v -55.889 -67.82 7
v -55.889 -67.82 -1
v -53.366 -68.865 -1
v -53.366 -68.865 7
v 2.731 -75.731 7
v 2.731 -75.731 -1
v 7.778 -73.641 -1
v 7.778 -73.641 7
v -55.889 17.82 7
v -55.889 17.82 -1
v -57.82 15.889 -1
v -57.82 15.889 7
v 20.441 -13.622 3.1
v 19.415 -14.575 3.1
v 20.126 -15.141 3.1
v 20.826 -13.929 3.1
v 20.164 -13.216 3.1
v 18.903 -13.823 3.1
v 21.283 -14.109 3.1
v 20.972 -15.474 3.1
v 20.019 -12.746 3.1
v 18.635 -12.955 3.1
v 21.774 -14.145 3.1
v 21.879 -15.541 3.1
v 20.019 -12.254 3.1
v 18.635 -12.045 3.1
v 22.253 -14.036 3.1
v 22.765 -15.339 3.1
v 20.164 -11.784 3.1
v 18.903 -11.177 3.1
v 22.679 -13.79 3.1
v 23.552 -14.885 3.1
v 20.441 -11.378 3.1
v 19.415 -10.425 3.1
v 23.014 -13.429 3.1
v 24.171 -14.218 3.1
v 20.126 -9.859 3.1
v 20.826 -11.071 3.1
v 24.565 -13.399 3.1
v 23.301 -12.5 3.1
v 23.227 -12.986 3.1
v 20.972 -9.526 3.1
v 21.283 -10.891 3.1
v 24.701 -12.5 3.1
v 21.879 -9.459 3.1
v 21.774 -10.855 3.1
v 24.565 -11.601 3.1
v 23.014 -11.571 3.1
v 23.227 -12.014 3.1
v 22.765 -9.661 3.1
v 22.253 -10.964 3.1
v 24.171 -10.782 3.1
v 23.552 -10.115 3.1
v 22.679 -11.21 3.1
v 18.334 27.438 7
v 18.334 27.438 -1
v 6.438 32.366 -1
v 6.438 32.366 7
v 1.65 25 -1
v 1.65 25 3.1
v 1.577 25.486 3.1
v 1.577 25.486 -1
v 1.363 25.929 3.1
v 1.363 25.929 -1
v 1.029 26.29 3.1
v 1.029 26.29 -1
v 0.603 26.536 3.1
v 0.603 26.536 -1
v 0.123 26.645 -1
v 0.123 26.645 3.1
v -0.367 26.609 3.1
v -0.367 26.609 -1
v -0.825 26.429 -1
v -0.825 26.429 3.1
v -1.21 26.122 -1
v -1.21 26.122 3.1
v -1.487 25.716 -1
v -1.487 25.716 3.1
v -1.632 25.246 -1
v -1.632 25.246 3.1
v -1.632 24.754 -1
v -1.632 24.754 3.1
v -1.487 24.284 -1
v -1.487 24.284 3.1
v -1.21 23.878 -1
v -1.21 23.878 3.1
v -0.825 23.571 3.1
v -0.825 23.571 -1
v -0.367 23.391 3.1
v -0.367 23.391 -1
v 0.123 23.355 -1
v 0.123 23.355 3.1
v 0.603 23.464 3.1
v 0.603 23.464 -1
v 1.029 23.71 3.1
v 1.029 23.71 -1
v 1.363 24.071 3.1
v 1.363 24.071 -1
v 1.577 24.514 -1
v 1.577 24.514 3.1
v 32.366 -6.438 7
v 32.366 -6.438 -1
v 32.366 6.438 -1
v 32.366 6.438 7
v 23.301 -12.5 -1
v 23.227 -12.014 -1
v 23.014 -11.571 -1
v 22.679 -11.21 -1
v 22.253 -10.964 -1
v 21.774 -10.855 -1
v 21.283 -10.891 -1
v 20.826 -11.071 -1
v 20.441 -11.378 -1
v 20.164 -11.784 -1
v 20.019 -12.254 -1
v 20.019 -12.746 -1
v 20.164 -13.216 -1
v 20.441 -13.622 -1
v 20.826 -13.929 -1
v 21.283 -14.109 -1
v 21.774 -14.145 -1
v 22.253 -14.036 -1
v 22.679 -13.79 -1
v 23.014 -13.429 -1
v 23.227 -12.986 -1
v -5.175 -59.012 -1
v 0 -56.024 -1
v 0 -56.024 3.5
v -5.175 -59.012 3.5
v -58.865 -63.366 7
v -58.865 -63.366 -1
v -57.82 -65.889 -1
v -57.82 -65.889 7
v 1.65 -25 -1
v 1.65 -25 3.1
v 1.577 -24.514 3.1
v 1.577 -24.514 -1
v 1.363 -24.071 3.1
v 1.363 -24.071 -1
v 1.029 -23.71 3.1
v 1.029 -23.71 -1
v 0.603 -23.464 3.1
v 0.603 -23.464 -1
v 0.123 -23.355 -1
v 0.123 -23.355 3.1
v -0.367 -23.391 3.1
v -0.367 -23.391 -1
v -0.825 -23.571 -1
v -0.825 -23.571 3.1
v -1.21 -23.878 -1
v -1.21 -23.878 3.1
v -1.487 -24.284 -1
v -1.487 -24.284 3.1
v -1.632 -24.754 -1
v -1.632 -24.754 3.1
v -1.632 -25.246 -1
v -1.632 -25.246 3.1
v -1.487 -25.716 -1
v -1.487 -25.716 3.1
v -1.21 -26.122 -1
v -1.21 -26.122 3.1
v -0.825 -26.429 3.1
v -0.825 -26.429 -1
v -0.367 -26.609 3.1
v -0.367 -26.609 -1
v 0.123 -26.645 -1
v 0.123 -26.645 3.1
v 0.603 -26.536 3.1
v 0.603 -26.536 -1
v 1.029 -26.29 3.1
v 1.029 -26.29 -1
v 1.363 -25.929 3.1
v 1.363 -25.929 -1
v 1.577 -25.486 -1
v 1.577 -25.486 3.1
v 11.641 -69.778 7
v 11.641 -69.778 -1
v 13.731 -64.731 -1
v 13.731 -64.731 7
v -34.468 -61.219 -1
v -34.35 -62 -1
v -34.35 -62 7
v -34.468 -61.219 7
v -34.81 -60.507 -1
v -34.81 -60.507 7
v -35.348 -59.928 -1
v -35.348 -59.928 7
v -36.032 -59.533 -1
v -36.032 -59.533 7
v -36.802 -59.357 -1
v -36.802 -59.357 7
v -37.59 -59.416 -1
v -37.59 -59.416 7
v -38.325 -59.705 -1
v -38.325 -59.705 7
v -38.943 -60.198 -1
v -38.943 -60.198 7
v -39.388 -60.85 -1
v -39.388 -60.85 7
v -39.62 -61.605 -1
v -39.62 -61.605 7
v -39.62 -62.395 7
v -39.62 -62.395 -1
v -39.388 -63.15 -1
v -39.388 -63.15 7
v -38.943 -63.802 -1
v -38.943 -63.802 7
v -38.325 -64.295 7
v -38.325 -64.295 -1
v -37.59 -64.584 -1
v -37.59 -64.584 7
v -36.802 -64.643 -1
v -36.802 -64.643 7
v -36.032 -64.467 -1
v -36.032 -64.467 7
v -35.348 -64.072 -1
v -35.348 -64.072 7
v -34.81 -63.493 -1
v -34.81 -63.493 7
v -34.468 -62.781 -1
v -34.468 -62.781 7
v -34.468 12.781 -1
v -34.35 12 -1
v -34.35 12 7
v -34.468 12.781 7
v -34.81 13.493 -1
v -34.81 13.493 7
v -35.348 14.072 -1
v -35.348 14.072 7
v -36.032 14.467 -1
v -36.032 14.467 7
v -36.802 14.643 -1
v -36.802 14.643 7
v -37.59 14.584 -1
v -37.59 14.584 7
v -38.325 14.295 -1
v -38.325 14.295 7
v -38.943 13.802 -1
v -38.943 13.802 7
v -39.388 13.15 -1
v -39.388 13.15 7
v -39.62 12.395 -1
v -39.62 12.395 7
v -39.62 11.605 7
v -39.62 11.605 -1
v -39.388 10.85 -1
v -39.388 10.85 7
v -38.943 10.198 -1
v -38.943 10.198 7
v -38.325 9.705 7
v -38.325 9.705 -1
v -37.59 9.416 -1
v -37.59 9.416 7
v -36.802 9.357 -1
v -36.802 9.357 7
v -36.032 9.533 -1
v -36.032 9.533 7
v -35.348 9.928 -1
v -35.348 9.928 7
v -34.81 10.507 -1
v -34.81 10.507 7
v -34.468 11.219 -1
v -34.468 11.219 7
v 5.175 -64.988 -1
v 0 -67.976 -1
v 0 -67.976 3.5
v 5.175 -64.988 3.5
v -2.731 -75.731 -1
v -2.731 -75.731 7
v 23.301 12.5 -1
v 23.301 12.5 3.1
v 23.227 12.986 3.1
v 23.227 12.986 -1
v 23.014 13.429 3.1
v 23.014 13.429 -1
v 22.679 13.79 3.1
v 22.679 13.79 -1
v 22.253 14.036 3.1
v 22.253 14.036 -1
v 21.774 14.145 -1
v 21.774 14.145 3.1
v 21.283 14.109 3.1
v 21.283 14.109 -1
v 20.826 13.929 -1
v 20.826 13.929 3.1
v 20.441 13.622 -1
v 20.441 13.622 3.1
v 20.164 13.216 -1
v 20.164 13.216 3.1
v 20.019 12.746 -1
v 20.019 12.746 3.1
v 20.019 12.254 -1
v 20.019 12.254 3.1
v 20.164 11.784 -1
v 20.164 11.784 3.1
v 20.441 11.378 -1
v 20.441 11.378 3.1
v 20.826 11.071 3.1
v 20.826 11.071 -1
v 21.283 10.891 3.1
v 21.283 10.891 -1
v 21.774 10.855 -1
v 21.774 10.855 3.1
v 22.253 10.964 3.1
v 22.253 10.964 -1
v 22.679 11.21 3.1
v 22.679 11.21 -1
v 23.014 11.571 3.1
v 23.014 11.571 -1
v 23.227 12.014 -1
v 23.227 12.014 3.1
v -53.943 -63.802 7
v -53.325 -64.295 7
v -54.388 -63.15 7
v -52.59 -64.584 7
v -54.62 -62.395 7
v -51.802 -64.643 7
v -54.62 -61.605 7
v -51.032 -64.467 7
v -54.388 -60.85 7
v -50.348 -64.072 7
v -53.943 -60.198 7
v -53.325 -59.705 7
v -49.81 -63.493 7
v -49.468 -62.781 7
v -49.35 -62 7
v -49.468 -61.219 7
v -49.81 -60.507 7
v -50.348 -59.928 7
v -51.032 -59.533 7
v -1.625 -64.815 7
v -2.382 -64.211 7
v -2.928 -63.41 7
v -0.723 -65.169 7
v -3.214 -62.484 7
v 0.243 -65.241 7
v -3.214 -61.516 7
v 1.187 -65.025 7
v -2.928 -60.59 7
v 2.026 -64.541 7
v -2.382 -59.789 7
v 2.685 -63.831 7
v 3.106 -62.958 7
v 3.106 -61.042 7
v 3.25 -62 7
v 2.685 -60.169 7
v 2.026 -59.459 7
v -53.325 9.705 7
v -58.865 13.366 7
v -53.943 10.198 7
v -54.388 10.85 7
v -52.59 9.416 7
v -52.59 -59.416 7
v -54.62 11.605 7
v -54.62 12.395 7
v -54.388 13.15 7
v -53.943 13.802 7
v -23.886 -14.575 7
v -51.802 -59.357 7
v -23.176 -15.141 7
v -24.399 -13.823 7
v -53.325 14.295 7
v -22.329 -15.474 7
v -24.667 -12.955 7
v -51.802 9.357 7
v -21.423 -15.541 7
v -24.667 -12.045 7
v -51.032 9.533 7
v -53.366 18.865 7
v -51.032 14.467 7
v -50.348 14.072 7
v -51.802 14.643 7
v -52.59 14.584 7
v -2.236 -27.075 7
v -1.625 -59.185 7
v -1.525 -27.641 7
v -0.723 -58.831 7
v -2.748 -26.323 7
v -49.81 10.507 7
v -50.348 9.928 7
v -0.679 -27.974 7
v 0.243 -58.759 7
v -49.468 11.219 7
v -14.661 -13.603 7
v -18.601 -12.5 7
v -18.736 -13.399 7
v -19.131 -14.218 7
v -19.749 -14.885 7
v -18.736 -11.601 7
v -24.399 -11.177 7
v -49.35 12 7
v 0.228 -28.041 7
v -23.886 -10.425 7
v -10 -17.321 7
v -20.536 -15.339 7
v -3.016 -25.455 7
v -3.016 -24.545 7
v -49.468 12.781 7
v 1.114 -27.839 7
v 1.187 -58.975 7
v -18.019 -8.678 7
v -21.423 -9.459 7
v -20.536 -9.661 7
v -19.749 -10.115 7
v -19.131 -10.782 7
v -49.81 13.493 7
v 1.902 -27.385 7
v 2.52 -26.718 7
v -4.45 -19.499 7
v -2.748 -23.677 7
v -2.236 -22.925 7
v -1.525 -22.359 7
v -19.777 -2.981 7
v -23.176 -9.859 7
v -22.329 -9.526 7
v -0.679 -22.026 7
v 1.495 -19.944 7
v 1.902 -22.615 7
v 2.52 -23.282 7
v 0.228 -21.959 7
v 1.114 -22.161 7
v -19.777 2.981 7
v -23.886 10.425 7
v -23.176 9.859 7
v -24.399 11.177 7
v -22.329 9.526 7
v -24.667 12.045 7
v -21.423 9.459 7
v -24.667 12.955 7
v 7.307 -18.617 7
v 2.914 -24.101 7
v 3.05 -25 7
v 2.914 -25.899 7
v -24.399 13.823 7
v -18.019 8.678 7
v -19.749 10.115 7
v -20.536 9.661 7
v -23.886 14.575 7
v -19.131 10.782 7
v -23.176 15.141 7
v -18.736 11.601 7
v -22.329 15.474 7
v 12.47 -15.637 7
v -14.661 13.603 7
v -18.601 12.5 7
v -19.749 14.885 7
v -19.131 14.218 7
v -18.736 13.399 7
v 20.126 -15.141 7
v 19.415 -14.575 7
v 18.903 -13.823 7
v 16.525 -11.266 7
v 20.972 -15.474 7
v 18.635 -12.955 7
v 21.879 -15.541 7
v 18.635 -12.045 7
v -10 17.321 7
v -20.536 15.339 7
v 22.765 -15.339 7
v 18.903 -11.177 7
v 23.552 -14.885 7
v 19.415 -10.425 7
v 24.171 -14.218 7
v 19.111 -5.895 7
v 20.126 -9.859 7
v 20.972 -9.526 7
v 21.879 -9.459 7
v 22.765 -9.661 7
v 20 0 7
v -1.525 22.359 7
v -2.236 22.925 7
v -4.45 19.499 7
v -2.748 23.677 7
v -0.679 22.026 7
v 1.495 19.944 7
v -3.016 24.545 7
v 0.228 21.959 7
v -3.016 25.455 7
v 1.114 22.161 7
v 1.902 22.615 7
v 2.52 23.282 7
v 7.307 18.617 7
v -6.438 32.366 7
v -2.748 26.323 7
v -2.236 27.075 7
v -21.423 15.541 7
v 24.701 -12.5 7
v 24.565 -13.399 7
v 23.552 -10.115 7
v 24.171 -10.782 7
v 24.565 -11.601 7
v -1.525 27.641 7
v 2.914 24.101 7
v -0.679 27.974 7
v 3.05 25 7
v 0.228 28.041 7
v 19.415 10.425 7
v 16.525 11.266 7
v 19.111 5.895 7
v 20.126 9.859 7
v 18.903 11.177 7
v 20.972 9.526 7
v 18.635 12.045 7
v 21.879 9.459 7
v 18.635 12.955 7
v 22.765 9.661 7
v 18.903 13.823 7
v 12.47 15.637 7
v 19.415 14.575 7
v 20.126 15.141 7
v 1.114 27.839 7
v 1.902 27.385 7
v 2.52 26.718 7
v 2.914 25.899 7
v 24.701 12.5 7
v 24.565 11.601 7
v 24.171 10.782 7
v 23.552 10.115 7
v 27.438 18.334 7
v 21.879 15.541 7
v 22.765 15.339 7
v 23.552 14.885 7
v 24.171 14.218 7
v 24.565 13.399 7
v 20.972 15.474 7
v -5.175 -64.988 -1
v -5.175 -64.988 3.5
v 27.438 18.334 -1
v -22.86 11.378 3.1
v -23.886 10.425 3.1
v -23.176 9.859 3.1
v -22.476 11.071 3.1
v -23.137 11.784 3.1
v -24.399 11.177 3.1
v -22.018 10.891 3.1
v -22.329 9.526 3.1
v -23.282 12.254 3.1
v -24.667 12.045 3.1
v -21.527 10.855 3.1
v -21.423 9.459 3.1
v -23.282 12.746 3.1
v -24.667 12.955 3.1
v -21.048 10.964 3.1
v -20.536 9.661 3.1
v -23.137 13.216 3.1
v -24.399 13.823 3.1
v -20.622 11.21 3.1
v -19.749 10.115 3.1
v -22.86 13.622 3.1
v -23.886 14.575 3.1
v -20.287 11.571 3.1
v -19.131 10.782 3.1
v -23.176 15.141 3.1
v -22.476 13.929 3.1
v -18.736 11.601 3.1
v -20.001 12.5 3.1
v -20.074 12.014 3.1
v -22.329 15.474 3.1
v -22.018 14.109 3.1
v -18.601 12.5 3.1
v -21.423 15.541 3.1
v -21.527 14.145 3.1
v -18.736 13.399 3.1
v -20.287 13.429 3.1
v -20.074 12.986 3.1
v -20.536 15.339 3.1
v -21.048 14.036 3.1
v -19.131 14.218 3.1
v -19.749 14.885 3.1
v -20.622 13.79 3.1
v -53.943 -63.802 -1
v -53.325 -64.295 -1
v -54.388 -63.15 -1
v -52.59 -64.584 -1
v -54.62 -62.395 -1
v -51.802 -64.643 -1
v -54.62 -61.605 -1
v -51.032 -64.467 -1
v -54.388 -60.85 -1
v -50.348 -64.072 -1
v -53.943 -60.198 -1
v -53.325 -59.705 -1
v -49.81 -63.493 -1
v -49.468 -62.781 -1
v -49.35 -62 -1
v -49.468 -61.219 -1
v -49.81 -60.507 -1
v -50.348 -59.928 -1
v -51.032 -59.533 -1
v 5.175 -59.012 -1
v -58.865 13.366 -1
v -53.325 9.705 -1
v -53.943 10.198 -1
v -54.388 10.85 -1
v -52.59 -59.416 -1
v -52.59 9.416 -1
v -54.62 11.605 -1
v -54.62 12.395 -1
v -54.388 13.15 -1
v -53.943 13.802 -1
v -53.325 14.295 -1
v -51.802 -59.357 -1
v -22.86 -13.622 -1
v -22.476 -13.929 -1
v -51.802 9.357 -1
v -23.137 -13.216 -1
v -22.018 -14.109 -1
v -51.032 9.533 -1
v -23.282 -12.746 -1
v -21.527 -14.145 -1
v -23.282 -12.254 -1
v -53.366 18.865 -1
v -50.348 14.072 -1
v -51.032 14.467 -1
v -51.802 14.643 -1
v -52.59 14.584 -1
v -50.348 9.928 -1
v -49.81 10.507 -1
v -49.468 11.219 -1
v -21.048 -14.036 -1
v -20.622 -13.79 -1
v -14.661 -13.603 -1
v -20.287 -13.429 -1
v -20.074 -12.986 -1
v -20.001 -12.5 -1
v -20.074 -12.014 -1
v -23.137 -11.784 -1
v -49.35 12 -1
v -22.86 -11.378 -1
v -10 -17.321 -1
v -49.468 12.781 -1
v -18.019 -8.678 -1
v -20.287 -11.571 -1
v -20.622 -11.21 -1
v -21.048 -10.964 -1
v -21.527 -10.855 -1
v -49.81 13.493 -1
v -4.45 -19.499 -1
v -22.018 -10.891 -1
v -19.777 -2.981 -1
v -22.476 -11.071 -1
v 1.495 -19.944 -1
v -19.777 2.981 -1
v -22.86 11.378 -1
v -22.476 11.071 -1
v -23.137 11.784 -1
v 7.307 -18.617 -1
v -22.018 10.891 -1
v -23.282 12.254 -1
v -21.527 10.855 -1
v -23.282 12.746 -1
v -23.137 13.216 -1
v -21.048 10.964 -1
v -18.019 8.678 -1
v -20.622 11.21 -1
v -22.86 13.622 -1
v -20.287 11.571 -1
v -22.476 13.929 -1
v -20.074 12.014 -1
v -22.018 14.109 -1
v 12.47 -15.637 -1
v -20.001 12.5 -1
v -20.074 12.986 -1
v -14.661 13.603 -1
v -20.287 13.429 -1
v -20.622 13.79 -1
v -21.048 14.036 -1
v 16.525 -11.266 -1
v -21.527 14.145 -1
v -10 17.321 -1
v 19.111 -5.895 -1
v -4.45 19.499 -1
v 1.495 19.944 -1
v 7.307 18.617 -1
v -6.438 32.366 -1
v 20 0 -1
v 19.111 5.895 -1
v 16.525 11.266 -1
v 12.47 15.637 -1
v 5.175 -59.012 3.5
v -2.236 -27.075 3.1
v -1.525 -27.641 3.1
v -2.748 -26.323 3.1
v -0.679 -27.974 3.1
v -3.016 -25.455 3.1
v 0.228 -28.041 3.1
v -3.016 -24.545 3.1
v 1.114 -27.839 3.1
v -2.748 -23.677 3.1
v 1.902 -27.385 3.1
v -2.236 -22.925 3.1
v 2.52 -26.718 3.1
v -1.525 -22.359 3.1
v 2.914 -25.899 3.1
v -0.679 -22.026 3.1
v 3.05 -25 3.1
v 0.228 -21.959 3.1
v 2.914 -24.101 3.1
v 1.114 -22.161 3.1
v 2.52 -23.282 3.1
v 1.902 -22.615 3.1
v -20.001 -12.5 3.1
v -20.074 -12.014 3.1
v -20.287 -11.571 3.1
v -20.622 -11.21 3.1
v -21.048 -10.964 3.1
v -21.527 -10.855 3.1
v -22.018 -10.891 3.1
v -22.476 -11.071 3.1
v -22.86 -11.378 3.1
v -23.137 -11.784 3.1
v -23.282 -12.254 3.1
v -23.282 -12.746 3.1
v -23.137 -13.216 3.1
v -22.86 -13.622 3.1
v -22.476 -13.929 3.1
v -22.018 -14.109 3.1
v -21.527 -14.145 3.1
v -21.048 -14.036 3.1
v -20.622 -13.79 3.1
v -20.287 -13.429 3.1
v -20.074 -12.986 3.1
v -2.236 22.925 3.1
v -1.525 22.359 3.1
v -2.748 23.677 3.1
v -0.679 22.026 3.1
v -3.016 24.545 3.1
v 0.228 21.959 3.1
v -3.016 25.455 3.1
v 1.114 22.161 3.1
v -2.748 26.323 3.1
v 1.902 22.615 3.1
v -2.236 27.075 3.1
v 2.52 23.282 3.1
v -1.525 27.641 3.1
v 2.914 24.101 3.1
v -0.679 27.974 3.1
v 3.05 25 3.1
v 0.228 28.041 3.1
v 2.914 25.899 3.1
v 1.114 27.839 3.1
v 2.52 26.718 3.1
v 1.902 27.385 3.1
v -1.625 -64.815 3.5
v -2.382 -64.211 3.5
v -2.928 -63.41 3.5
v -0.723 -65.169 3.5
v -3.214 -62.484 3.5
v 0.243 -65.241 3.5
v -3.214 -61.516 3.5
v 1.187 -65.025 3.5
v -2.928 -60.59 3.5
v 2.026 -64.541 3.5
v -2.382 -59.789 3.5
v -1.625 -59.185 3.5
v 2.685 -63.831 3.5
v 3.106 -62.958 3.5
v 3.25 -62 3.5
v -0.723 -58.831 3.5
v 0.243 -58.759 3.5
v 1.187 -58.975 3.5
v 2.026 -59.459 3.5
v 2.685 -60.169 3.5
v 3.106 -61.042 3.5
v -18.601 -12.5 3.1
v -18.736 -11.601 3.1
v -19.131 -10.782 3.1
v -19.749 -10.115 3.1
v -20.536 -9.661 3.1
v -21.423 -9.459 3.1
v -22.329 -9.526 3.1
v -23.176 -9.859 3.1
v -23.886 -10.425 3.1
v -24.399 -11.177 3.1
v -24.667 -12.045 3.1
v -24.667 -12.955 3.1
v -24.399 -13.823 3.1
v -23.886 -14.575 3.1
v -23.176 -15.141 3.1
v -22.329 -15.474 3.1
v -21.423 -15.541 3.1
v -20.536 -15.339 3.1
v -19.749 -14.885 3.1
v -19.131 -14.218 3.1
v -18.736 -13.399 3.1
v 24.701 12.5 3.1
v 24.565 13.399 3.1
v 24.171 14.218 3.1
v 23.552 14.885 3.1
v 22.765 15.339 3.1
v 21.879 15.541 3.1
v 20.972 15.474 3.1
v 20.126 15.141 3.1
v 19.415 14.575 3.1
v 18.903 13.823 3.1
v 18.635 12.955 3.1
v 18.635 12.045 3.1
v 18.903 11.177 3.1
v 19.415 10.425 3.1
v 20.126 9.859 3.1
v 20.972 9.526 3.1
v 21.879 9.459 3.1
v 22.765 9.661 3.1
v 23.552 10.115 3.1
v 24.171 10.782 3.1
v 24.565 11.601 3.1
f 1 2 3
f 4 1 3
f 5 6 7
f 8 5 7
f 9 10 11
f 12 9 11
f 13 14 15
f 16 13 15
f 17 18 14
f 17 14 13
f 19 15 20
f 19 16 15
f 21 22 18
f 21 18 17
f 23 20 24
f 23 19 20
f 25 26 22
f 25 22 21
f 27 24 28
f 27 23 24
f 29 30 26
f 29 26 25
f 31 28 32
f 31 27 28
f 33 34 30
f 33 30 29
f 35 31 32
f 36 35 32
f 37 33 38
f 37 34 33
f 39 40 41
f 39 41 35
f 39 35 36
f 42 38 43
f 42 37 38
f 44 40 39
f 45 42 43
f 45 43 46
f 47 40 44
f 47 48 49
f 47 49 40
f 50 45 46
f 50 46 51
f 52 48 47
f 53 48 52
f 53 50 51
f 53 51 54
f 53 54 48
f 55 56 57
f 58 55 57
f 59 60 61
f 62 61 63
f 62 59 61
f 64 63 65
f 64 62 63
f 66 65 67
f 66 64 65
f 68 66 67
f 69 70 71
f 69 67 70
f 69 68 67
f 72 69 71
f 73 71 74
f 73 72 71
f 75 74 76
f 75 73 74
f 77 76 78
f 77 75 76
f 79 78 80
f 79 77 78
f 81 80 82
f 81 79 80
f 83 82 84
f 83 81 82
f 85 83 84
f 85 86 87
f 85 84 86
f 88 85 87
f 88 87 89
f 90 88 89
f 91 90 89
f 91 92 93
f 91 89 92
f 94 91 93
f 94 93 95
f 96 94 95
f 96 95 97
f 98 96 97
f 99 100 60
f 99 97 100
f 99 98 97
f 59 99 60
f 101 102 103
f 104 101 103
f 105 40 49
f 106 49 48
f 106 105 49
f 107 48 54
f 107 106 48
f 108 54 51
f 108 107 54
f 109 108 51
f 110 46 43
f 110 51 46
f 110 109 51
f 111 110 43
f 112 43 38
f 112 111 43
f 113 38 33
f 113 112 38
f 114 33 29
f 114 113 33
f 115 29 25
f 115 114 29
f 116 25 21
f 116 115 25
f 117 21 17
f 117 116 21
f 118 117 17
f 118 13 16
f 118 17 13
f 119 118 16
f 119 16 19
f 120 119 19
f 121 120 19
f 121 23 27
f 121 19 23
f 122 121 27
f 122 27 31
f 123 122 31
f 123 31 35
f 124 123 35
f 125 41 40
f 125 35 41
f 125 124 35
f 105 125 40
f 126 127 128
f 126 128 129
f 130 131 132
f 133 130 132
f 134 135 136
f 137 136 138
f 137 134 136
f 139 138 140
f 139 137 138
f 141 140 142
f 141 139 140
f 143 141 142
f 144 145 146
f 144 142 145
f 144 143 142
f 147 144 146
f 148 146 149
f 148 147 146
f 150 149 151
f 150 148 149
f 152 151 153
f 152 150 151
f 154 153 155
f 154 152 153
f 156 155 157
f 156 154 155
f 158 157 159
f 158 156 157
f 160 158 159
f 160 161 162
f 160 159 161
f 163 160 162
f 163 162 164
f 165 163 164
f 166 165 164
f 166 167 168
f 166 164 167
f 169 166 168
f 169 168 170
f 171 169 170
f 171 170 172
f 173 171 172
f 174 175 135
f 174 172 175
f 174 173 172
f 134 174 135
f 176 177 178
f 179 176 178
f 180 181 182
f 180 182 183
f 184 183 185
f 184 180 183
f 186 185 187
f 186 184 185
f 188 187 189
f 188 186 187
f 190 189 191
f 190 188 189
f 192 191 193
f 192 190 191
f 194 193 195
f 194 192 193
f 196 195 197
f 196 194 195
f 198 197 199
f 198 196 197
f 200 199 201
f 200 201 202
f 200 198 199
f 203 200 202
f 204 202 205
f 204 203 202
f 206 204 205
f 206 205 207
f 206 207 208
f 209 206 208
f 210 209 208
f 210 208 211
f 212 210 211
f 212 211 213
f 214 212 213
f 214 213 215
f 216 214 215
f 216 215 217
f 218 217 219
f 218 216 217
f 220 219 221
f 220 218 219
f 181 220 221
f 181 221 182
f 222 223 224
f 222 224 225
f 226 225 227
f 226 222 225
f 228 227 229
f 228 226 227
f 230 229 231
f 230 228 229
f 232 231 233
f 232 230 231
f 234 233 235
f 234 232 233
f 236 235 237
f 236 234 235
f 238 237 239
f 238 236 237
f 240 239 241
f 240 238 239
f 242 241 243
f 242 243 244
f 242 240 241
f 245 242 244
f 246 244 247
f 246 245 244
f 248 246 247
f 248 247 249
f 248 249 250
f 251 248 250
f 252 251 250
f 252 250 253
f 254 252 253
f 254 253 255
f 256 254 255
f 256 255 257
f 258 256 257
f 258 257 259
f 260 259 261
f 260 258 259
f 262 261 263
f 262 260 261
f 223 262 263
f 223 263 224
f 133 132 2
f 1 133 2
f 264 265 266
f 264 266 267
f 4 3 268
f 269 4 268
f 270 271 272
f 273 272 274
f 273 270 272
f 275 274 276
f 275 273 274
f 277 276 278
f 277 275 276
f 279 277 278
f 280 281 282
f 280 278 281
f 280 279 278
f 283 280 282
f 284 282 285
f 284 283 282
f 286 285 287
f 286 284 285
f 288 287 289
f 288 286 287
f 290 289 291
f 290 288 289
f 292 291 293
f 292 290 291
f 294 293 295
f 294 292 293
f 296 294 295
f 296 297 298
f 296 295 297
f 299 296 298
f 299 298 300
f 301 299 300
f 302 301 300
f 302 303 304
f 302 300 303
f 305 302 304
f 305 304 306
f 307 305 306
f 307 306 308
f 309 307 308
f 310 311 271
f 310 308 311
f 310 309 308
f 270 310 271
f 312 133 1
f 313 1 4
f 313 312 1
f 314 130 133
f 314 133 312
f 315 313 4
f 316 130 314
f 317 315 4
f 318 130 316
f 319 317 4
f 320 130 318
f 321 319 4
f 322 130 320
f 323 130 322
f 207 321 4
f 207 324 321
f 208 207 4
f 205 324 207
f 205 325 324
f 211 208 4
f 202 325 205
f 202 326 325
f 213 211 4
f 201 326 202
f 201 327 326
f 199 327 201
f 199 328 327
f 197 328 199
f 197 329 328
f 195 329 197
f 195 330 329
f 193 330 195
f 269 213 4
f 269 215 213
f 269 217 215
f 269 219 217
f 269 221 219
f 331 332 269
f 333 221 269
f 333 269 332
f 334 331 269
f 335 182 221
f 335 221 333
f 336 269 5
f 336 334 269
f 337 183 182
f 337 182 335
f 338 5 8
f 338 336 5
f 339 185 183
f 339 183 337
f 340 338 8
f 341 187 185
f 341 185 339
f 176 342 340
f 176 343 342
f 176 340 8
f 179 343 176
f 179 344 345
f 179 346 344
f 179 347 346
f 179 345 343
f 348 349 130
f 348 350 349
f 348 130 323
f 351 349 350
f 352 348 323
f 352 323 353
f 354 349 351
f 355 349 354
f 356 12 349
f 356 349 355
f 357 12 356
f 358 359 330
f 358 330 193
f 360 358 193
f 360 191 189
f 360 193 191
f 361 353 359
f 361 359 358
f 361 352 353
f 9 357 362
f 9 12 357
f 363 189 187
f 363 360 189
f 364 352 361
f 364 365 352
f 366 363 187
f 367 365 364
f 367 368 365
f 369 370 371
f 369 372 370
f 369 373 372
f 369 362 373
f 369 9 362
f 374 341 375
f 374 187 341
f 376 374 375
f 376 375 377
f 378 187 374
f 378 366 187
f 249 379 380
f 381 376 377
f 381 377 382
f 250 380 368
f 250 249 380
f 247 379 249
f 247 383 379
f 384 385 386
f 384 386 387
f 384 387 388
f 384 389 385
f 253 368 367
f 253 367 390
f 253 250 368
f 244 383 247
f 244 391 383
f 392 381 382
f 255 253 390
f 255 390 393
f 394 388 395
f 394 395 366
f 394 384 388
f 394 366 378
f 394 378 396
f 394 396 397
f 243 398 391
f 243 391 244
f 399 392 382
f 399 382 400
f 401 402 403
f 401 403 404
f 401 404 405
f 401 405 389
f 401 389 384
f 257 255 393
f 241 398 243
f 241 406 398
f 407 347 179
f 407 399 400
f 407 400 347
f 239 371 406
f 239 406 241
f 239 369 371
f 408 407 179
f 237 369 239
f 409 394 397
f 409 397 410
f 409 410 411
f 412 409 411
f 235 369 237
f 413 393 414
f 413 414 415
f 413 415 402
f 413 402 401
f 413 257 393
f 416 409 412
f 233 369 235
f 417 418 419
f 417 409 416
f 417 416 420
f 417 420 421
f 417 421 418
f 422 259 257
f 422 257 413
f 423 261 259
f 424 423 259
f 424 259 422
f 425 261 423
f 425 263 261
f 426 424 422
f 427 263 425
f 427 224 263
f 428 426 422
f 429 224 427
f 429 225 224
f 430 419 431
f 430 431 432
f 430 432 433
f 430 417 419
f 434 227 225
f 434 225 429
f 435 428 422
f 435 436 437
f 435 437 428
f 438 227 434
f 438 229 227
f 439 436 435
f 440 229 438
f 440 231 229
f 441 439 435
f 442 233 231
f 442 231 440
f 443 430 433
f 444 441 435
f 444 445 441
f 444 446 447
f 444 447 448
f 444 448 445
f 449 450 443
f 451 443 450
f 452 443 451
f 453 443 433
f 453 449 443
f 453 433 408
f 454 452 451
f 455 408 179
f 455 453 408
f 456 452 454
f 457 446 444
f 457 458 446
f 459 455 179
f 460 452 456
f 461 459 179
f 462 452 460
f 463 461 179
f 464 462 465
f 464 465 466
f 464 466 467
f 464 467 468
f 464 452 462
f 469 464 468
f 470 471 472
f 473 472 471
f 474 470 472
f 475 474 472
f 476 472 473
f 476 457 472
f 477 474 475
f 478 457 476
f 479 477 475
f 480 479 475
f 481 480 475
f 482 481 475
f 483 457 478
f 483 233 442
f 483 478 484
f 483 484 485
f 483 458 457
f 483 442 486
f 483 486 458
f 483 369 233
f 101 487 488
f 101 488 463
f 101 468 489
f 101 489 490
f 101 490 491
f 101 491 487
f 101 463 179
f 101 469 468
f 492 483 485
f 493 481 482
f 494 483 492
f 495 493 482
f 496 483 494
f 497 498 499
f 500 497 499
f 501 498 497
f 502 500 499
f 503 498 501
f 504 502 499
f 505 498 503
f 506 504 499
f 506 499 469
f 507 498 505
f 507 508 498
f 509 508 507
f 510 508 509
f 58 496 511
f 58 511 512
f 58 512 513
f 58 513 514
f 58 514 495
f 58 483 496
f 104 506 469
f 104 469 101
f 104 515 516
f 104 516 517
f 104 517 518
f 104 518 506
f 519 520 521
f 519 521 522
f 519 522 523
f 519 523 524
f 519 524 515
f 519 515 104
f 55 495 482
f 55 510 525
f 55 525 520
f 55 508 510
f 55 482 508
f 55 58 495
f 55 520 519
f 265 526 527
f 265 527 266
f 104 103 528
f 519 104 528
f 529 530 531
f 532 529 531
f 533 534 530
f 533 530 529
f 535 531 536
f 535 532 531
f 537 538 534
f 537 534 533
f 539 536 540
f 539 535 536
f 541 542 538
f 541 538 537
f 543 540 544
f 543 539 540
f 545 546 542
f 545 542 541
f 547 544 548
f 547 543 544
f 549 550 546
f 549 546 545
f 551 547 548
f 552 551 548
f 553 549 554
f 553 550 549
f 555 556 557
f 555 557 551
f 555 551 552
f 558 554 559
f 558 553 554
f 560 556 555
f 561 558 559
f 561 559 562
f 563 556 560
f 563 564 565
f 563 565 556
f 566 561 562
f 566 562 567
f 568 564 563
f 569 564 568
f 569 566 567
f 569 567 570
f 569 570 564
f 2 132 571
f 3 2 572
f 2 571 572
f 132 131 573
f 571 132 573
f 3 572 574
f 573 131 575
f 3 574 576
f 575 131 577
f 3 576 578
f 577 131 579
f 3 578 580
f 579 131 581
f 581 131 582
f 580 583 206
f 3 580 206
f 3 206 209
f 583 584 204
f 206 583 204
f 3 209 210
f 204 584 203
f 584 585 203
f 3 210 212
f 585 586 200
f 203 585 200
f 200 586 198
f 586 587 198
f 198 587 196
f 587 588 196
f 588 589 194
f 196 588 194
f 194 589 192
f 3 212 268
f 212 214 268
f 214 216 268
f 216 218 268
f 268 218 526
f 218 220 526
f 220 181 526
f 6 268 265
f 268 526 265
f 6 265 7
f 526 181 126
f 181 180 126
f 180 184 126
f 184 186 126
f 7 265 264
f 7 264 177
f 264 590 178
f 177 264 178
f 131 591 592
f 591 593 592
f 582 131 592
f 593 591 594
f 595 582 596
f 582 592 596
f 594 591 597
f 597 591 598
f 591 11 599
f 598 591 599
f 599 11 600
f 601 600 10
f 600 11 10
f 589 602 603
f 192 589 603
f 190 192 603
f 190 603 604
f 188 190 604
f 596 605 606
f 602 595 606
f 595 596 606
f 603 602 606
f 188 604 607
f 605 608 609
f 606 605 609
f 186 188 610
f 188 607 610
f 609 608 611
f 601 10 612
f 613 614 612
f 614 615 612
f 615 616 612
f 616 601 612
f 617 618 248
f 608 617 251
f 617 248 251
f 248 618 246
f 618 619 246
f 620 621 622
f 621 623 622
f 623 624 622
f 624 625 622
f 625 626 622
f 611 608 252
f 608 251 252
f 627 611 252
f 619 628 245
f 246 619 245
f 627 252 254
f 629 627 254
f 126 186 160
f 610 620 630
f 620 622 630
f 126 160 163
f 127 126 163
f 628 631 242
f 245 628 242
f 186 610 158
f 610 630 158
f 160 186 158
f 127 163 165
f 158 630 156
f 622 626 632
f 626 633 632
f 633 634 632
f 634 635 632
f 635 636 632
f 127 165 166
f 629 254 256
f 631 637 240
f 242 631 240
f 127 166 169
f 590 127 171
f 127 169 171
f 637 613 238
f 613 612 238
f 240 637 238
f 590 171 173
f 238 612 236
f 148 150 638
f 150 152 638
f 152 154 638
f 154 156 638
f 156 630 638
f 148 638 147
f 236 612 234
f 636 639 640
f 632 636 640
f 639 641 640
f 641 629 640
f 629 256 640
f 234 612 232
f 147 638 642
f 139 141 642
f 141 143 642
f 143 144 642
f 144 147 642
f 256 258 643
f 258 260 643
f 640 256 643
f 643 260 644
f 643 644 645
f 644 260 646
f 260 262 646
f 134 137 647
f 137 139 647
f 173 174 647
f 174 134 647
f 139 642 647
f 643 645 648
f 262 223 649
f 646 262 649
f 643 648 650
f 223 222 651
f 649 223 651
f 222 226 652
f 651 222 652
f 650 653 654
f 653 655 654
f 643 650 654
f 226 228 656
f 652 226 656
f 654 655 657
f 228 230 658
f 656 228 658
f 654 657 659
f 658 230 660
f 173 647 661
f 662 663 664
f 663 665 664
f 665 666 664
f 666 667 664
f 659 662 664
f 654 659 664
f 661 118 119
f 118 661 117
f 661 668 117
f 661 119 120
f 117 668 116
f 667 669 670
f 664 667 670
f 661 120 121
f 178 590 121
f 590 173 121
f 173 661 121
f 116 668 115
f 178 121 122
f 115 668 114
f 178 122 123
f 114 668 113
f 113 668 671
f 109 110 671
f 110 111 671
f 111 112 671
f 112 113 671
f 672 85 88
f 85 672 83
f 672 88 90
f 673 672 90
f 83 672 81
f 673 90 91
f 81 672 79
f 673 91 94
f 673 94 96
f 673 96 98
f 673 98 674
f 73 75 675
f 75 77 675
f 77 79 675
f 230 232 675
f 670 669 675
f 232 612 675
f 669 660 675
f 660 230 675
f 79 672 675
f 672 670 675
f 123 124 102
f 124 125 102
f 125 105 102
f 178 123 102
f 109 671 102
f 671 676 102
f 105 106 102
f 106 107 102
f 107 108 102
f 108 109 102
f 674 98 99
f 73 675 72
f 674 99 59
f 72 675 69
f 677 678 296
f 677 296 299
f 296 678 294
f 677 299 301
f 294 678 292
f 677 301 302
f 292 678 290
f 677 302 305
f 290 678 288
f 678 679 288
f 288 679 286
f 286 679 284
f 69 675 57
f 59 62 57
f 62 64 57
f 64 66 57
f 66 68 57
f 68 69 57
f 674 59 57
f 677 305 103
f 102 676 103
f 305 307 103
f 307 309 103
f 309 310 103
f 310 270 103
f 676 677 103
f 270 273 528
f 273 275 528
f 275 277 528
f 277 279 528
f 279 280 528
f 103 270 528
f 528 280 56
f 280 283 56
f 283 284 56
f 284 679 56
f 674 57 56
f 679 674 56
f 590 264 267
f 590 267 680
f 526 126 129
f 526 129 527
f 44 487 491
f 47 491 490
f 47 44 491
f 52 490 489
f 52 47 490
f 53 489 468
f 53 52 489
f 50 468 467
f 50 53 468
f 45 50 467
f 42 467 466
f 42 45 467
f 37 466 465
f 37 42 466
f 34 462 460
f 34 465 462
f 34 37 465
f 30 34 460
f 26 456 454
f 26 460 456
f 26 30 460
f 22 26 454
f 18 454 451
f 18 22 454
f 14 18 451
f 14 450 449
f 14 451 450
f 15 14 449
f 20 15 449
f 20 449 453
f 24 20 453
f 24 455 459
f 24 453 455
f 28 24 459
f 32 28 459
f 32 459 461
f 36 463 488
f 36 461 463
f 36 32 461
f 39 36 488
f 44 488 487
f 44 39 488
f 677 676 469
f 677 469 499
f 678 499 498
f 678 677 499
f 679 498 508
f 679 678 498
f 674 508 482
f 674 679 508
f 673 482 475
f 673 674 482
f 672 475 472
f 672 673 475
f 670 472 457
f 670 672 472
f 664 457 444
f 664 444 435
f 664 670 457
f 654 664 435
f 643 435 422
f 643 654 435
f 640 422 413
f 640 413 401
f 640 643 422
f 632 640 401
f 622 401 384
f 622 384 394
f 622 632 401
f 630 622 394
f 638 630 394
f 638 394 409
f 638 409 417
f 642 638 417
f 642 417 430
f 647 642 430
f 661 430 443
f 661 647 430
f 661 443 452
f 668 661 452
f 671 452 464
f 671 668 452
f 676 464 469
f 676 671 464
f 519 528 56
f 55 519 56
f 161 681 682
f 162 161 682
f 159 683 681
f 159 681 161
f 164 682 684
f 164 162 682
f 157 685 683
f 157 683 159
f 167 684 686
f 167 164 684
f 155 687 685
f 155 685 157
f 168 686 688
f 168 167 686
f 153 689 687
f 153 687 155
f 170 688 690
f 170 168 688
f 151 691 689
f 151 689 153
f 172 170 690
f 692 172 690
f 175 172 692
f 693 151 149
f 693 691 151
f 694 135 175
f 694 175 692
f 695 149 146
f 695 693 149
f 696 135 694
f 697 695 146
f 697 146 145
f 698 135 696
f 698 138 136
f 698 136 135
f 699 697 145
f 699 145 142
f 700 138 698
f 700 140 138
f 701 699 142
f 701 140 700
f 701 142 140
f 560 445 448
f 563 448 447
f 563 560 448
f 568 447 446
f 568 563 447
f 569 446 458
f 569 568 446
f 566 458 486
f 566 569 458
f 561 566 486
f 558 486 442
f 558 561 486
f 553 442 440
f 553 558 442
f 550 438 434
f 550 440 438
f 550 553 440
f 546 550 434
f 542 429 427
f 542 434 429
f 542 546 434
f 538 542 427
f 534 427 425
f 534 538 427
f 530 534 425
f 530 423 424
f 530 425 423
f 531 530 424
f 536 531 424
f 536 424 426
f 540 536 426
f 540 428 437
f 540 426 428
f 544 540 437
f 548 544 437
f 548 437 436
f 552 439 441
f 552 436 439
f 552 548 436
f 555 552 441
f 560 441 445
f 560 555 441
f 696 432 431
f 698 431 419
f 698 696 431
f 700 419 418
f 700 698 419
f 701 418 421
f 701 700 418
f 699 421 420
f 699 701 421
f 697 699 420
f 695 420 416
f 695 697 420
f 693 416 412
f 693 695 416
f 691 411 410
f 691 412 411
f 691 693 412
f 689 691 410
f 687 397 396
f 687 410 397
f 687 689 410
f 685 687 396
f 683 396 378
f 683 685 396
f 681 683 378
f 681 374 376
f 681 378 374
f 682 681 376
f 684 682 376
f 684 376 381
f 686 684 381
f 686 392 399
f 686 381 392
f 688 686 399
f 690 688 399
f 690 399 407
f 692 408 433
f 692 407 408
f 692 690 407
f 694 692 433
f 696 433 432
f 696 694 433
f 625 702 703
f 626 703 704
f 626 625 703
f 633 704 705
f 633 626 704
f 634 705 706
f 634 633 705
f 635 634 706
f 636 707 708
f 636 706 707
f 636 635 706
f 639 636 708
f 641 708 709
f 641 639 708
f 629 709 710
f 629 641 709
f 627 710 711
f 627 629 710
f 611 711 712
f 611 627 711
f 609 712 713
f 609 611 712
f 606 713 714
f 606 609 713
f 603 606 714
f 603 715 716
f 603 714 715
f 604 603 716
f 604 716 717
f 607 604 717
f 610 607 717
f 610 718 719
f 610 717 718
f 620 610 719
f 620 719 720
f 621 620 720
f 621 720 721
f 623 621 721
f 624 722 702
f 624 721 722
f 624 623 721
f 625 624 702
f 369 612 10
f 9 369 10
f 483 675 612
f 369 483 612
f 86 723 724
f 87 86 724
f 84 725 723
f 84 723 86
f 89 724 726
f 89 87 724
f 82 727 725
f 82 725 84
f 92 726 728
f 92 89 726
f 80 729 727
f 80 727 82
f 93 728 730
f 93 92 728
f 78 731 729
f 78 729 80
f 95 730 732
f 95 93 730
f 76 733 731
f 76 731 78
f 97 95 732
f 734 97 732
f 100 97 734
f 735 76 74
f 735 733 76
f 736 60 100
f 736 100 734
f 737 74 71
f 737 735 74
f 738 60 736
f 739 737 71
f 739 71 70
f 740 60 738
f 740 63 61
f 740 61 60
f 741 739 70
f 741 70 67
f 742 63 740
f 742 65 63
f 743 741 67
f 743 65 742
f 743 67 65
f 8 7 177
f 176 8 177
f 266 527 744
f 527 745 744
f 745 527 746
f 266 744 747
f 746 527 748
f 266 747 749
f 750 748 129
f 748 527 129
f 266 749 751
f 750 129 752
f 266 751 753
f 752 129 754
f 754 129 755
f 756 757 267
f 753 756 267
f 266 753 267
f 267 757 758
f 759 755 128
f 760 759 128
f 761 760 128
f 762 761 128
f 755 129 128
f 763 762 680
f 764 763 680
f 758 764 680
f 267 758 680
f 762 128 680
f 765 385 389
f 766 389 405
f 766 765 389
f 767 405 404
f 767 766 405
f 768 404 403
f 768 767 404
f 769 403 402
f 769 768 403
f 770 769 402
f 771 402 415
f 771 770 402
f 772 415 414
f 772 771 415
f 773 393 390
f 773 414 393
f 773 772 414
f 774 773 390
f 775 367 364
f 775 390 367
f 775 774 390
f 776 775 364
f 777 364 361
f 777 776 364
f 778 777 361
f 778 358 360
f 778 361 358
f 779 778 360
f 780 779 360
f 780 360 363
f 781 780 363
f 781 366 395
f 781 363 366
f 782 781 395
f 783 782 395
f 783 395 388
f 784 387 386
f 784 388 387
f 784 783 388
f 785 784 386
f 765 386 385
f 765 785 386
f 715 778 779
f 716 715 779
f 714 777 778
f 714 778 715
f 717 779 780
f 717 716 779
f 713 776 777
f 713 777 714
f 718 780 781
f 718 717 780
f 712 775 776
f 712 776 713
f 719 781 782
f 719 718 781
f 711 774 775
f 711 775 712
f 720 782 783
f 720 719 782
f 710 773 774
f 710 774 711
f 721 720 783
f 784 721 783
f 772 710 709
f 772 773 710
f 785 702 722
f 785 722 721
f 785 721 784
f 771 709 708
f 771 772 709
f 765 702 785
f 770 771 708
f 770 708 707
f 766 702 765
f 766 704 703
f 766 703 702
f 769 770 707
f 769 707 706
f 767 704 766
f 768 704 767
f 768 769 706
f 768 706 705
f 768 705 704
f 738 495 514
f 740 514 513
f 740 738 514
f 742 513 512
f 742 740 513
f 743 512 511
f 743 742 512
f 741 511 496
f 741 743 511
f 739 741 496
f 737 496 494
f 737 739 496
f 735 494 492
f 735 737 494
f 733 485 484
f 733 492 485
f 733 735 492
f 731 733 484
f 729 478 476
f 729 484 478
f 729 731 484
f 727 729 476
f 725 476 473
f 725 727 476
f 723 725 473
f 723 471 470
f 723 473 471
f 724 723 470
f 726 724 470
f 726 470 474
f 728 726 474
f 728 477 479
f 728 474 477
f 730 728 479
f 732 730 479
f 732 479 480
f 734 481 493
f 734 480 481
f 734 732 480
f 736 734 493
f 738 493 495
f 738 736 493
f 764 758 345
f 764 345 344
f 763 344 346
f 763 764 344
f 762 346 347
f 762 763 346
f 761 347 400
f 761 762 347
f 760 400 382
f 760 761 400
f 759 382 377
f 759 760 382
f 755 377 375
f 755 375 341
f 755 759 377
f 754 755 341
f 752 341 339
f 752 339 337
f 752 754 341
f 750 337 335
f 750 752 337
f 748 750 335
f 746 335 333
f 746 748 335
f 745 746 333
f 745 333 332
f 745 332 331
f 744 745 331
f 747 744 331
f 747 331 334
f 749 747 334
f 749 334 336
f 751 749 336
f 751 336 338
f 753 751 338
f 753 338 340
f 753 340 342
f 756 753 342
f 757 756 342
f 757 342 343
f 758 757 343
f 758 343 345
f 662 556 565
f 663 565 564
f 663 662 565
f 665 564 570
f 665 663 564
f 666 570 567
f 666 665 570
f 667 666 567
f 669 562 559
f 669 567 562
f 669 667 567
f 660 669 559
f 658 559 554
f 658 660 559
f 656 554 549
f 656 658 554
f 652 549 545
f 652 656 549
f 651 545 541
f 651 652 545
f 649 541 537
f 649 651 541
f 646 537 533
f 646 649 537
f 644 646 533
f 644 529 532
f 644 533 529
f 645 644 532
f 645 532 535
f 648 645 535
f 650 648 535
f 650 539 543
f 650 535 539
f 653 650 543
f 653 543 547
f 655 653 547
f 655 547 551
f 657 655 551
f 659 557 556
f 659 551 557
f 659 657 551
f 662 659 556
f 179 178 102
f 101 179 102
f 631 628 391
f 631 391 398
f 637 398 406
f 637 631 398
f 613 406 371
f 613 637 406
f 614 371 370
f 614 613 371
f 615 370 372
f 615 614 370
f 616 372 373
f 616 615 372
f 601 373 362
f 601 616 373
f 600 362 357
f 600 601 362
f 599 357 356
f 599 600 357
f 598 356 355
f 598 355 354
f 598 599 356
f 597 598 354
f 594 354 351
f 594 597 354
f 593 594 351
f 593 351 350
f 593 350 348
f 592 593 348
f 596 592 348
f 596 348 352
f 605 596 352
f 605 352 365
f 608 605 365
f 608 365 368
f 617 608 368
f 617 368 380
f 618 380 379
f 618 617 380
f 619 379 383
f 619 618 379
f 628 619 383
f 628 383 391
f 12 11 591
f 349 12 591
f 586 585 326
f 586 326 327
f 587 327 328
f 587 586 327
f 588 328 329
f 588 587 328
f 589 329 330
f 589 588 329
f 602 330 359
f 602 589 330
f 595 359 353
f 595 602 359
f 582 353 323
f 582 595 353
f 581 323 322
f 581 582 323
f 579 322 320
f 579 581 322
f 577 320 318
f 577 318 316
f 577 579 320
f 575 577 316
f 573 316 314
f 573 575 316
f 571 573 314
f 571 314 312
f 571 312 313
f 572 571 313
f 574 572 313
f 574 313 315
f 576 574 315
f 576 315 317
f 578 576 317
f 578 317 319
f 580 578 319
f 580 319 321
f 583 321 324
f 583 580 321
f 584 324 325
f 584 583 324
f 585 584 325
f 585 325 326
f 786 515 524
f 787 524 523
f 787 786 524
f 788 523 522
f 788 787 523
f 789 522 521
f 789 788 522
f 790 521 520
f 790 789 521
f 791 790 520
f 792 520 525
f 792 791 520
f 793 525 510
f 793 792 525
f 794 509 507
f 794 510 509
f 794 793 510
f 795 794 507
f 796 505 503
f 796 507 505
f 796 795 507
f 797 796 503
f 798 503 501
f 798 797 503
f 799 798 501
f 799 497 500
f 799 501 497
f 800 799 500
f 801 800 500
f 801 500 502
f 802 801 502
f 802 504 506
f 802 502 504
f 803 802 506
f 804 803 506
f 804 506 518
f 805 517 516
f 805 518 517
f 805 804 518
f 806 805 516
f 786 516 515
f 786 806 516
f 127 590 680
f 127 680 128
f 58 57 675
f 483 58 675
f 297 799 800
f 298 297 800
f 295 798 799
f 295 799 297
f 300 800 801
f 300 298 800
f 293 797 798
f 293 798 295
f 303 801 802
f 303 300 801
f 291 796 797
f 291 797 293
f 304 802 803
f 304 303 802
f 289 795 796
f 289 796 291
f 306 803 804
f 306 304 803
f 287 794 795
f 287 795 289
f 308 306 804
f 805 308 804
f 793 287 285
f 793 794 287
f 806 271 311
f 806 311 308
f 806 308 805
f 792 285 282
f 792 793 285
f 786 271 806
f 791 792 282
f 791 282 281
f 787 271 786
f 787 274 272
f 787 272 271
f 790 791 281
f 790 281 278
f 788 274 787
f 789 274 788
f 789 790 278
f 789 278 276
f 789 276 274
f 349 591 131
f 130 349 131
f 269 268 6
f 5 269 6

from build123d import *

# Parameters (mm, degrees)
FRAME_AND_BENCH_INTERFACE_START = -1
PROFILE_1_R                     = 20
PROFILE_1_R_2                   = 3.25
PROFILE_1_R_3                   = 1.65
PROFILE_1_R_4                   = 2.65
FRAME_AND_BENCH_INTERFACE_DEPTH = 8
RECESS_STATOR_SCREW_HEADS_START = 3.1
PROFILE_2_R                     = 3.05
RECESS_STATOR_SCREW_HEADS_DEPTH = 4
REAR_CAPTIVE_NUT_B_START        = -1.01
REAR_CAPTIVE_NUT_B_DEPTH        = 4.51


with BuildPart() as part:
    # Profile_1 → Frame_and_bench_interface (new body)
    with BuildSketch(Plane.XY.offset(FRAME_AND_BENCH_INTERFACE_START)):
        Polygon((-58.865496963, 13.365632254), (-58.865496963, -63.365632254), (-57.820287286, -65.888991631), (-55.888991631, -67.820287286), (-53.365632254, -68.865496963), (-2.731264508, -75.730993926), (2.731264508, -75.730993926), (7.777983262, -73.640574572), (11.640574572, -69.777983262), (13.730993926, -64.731264508), (32.365914253, -6.437980627), (32.365914253, 6.437980627), (27.438497206, 18.33381769), (18.33381769, 27.438497206), (6.437980627, 32.365914253), (-6.437980627, 32.365914253), (-53.365632254, 18.865496963), (-55.888991631, 17.820287286), (-57.820287286, 15.888991631), align=None)
        Circle(PROFILE_1_R, mode=Mode.SUBTRACT)
        with Locations((0, -62)):
            Circle(PROFILE_1_R_2, mode=Mode.SUBTRACT)
        with Locations((21.650635095, 12.5)):
            Circle(PROFILE_1_R_3, mode=Mode.SUBTRACT)
        with Locations((0, 25)):
            Circle(PROFILE_1_R_3, mode=Mode.SUBTRACT)
        with Locations((-21.650635095, 12.5)):
            Circle(PROFILE_1_R_3, mode=Mode.SUBTRACT)
        with Locations((-21.650635095, -12.5)):
            Circle(PROFILE_1_R_3, mode=Mode.SUBTRACT)
        with Locations((0, -25)):
            Circle(PROFILE_1_R_3, mode=Mode.SUBTRACT)
        with Locations((21.650635095, -12.5)):
            Circle(PROFILE_1_R_3, mode=Mode.SUBTRACT)
        with Locations((-52, 12)):
            Circle(PROFILE_1_R_4, mode=Mode.SUBTRACT)
        with Locations((-37, 12)):
            Circle(PROFILE_1_R_4, mode=Mode.SUBTRACT)
        with Locations((-52, -62)):
            Circle(PROFILE_1_R_4, mode=Mode.SUBTRACT)
        with Locations((-37, -62)):
            Circle(PROFILE_1_R_4, mode=Mode.SUBTRACT)
    extrude(amount=FRAME_AND_BENCH_INTERFACE_DEPTH)

    # Profile_2 → Recess_stator_screw_heads (cut)
    with BuildSketch(Plane.XY.offset(RECESS_STATOR_SCREW_HEADS_START)):
        with Locations((21.650635095, 12.5)):
            Circle(PROFILE_2_R)
        with Locations((0, 25)):
            Circle(PROFILE_2_R)
        with Locations((-21.650635095, 12.5)):
            Circle(PROFILE_2_R)
        with Locations((-21.650635095, -12.5)):
            Circle(PROFILE_2_R)
        with Locations((0, -25)):
            Circle(PROFILE_2_R)
        with Locations((21.650635095, -12.5)):
            Circle(PROFILE_2_R)
    extrude(amount=RECESS_STATOR_SCREW_HEADS_DEPTH, mode=Mode.SUBTRACT)

    # Profile_3 → Rear_captive_nut_B (cut)
    with BuildSketch(Plane.XY.offset(REAR_CAPTIVE_NUT_B_START)):
        Polygon((5.175, -59.012212357), (0, -56.024424714), (-5.175, -59.012212357), (-5.175, -64.987787643), (0, -67.975575286), (5.175, -64.987787643), align=None)
    extrude(amount=REAR_CAPTIVE_NUT_B_DEPTH, mode=Mode.SUBTRACT)


solid = part.part
